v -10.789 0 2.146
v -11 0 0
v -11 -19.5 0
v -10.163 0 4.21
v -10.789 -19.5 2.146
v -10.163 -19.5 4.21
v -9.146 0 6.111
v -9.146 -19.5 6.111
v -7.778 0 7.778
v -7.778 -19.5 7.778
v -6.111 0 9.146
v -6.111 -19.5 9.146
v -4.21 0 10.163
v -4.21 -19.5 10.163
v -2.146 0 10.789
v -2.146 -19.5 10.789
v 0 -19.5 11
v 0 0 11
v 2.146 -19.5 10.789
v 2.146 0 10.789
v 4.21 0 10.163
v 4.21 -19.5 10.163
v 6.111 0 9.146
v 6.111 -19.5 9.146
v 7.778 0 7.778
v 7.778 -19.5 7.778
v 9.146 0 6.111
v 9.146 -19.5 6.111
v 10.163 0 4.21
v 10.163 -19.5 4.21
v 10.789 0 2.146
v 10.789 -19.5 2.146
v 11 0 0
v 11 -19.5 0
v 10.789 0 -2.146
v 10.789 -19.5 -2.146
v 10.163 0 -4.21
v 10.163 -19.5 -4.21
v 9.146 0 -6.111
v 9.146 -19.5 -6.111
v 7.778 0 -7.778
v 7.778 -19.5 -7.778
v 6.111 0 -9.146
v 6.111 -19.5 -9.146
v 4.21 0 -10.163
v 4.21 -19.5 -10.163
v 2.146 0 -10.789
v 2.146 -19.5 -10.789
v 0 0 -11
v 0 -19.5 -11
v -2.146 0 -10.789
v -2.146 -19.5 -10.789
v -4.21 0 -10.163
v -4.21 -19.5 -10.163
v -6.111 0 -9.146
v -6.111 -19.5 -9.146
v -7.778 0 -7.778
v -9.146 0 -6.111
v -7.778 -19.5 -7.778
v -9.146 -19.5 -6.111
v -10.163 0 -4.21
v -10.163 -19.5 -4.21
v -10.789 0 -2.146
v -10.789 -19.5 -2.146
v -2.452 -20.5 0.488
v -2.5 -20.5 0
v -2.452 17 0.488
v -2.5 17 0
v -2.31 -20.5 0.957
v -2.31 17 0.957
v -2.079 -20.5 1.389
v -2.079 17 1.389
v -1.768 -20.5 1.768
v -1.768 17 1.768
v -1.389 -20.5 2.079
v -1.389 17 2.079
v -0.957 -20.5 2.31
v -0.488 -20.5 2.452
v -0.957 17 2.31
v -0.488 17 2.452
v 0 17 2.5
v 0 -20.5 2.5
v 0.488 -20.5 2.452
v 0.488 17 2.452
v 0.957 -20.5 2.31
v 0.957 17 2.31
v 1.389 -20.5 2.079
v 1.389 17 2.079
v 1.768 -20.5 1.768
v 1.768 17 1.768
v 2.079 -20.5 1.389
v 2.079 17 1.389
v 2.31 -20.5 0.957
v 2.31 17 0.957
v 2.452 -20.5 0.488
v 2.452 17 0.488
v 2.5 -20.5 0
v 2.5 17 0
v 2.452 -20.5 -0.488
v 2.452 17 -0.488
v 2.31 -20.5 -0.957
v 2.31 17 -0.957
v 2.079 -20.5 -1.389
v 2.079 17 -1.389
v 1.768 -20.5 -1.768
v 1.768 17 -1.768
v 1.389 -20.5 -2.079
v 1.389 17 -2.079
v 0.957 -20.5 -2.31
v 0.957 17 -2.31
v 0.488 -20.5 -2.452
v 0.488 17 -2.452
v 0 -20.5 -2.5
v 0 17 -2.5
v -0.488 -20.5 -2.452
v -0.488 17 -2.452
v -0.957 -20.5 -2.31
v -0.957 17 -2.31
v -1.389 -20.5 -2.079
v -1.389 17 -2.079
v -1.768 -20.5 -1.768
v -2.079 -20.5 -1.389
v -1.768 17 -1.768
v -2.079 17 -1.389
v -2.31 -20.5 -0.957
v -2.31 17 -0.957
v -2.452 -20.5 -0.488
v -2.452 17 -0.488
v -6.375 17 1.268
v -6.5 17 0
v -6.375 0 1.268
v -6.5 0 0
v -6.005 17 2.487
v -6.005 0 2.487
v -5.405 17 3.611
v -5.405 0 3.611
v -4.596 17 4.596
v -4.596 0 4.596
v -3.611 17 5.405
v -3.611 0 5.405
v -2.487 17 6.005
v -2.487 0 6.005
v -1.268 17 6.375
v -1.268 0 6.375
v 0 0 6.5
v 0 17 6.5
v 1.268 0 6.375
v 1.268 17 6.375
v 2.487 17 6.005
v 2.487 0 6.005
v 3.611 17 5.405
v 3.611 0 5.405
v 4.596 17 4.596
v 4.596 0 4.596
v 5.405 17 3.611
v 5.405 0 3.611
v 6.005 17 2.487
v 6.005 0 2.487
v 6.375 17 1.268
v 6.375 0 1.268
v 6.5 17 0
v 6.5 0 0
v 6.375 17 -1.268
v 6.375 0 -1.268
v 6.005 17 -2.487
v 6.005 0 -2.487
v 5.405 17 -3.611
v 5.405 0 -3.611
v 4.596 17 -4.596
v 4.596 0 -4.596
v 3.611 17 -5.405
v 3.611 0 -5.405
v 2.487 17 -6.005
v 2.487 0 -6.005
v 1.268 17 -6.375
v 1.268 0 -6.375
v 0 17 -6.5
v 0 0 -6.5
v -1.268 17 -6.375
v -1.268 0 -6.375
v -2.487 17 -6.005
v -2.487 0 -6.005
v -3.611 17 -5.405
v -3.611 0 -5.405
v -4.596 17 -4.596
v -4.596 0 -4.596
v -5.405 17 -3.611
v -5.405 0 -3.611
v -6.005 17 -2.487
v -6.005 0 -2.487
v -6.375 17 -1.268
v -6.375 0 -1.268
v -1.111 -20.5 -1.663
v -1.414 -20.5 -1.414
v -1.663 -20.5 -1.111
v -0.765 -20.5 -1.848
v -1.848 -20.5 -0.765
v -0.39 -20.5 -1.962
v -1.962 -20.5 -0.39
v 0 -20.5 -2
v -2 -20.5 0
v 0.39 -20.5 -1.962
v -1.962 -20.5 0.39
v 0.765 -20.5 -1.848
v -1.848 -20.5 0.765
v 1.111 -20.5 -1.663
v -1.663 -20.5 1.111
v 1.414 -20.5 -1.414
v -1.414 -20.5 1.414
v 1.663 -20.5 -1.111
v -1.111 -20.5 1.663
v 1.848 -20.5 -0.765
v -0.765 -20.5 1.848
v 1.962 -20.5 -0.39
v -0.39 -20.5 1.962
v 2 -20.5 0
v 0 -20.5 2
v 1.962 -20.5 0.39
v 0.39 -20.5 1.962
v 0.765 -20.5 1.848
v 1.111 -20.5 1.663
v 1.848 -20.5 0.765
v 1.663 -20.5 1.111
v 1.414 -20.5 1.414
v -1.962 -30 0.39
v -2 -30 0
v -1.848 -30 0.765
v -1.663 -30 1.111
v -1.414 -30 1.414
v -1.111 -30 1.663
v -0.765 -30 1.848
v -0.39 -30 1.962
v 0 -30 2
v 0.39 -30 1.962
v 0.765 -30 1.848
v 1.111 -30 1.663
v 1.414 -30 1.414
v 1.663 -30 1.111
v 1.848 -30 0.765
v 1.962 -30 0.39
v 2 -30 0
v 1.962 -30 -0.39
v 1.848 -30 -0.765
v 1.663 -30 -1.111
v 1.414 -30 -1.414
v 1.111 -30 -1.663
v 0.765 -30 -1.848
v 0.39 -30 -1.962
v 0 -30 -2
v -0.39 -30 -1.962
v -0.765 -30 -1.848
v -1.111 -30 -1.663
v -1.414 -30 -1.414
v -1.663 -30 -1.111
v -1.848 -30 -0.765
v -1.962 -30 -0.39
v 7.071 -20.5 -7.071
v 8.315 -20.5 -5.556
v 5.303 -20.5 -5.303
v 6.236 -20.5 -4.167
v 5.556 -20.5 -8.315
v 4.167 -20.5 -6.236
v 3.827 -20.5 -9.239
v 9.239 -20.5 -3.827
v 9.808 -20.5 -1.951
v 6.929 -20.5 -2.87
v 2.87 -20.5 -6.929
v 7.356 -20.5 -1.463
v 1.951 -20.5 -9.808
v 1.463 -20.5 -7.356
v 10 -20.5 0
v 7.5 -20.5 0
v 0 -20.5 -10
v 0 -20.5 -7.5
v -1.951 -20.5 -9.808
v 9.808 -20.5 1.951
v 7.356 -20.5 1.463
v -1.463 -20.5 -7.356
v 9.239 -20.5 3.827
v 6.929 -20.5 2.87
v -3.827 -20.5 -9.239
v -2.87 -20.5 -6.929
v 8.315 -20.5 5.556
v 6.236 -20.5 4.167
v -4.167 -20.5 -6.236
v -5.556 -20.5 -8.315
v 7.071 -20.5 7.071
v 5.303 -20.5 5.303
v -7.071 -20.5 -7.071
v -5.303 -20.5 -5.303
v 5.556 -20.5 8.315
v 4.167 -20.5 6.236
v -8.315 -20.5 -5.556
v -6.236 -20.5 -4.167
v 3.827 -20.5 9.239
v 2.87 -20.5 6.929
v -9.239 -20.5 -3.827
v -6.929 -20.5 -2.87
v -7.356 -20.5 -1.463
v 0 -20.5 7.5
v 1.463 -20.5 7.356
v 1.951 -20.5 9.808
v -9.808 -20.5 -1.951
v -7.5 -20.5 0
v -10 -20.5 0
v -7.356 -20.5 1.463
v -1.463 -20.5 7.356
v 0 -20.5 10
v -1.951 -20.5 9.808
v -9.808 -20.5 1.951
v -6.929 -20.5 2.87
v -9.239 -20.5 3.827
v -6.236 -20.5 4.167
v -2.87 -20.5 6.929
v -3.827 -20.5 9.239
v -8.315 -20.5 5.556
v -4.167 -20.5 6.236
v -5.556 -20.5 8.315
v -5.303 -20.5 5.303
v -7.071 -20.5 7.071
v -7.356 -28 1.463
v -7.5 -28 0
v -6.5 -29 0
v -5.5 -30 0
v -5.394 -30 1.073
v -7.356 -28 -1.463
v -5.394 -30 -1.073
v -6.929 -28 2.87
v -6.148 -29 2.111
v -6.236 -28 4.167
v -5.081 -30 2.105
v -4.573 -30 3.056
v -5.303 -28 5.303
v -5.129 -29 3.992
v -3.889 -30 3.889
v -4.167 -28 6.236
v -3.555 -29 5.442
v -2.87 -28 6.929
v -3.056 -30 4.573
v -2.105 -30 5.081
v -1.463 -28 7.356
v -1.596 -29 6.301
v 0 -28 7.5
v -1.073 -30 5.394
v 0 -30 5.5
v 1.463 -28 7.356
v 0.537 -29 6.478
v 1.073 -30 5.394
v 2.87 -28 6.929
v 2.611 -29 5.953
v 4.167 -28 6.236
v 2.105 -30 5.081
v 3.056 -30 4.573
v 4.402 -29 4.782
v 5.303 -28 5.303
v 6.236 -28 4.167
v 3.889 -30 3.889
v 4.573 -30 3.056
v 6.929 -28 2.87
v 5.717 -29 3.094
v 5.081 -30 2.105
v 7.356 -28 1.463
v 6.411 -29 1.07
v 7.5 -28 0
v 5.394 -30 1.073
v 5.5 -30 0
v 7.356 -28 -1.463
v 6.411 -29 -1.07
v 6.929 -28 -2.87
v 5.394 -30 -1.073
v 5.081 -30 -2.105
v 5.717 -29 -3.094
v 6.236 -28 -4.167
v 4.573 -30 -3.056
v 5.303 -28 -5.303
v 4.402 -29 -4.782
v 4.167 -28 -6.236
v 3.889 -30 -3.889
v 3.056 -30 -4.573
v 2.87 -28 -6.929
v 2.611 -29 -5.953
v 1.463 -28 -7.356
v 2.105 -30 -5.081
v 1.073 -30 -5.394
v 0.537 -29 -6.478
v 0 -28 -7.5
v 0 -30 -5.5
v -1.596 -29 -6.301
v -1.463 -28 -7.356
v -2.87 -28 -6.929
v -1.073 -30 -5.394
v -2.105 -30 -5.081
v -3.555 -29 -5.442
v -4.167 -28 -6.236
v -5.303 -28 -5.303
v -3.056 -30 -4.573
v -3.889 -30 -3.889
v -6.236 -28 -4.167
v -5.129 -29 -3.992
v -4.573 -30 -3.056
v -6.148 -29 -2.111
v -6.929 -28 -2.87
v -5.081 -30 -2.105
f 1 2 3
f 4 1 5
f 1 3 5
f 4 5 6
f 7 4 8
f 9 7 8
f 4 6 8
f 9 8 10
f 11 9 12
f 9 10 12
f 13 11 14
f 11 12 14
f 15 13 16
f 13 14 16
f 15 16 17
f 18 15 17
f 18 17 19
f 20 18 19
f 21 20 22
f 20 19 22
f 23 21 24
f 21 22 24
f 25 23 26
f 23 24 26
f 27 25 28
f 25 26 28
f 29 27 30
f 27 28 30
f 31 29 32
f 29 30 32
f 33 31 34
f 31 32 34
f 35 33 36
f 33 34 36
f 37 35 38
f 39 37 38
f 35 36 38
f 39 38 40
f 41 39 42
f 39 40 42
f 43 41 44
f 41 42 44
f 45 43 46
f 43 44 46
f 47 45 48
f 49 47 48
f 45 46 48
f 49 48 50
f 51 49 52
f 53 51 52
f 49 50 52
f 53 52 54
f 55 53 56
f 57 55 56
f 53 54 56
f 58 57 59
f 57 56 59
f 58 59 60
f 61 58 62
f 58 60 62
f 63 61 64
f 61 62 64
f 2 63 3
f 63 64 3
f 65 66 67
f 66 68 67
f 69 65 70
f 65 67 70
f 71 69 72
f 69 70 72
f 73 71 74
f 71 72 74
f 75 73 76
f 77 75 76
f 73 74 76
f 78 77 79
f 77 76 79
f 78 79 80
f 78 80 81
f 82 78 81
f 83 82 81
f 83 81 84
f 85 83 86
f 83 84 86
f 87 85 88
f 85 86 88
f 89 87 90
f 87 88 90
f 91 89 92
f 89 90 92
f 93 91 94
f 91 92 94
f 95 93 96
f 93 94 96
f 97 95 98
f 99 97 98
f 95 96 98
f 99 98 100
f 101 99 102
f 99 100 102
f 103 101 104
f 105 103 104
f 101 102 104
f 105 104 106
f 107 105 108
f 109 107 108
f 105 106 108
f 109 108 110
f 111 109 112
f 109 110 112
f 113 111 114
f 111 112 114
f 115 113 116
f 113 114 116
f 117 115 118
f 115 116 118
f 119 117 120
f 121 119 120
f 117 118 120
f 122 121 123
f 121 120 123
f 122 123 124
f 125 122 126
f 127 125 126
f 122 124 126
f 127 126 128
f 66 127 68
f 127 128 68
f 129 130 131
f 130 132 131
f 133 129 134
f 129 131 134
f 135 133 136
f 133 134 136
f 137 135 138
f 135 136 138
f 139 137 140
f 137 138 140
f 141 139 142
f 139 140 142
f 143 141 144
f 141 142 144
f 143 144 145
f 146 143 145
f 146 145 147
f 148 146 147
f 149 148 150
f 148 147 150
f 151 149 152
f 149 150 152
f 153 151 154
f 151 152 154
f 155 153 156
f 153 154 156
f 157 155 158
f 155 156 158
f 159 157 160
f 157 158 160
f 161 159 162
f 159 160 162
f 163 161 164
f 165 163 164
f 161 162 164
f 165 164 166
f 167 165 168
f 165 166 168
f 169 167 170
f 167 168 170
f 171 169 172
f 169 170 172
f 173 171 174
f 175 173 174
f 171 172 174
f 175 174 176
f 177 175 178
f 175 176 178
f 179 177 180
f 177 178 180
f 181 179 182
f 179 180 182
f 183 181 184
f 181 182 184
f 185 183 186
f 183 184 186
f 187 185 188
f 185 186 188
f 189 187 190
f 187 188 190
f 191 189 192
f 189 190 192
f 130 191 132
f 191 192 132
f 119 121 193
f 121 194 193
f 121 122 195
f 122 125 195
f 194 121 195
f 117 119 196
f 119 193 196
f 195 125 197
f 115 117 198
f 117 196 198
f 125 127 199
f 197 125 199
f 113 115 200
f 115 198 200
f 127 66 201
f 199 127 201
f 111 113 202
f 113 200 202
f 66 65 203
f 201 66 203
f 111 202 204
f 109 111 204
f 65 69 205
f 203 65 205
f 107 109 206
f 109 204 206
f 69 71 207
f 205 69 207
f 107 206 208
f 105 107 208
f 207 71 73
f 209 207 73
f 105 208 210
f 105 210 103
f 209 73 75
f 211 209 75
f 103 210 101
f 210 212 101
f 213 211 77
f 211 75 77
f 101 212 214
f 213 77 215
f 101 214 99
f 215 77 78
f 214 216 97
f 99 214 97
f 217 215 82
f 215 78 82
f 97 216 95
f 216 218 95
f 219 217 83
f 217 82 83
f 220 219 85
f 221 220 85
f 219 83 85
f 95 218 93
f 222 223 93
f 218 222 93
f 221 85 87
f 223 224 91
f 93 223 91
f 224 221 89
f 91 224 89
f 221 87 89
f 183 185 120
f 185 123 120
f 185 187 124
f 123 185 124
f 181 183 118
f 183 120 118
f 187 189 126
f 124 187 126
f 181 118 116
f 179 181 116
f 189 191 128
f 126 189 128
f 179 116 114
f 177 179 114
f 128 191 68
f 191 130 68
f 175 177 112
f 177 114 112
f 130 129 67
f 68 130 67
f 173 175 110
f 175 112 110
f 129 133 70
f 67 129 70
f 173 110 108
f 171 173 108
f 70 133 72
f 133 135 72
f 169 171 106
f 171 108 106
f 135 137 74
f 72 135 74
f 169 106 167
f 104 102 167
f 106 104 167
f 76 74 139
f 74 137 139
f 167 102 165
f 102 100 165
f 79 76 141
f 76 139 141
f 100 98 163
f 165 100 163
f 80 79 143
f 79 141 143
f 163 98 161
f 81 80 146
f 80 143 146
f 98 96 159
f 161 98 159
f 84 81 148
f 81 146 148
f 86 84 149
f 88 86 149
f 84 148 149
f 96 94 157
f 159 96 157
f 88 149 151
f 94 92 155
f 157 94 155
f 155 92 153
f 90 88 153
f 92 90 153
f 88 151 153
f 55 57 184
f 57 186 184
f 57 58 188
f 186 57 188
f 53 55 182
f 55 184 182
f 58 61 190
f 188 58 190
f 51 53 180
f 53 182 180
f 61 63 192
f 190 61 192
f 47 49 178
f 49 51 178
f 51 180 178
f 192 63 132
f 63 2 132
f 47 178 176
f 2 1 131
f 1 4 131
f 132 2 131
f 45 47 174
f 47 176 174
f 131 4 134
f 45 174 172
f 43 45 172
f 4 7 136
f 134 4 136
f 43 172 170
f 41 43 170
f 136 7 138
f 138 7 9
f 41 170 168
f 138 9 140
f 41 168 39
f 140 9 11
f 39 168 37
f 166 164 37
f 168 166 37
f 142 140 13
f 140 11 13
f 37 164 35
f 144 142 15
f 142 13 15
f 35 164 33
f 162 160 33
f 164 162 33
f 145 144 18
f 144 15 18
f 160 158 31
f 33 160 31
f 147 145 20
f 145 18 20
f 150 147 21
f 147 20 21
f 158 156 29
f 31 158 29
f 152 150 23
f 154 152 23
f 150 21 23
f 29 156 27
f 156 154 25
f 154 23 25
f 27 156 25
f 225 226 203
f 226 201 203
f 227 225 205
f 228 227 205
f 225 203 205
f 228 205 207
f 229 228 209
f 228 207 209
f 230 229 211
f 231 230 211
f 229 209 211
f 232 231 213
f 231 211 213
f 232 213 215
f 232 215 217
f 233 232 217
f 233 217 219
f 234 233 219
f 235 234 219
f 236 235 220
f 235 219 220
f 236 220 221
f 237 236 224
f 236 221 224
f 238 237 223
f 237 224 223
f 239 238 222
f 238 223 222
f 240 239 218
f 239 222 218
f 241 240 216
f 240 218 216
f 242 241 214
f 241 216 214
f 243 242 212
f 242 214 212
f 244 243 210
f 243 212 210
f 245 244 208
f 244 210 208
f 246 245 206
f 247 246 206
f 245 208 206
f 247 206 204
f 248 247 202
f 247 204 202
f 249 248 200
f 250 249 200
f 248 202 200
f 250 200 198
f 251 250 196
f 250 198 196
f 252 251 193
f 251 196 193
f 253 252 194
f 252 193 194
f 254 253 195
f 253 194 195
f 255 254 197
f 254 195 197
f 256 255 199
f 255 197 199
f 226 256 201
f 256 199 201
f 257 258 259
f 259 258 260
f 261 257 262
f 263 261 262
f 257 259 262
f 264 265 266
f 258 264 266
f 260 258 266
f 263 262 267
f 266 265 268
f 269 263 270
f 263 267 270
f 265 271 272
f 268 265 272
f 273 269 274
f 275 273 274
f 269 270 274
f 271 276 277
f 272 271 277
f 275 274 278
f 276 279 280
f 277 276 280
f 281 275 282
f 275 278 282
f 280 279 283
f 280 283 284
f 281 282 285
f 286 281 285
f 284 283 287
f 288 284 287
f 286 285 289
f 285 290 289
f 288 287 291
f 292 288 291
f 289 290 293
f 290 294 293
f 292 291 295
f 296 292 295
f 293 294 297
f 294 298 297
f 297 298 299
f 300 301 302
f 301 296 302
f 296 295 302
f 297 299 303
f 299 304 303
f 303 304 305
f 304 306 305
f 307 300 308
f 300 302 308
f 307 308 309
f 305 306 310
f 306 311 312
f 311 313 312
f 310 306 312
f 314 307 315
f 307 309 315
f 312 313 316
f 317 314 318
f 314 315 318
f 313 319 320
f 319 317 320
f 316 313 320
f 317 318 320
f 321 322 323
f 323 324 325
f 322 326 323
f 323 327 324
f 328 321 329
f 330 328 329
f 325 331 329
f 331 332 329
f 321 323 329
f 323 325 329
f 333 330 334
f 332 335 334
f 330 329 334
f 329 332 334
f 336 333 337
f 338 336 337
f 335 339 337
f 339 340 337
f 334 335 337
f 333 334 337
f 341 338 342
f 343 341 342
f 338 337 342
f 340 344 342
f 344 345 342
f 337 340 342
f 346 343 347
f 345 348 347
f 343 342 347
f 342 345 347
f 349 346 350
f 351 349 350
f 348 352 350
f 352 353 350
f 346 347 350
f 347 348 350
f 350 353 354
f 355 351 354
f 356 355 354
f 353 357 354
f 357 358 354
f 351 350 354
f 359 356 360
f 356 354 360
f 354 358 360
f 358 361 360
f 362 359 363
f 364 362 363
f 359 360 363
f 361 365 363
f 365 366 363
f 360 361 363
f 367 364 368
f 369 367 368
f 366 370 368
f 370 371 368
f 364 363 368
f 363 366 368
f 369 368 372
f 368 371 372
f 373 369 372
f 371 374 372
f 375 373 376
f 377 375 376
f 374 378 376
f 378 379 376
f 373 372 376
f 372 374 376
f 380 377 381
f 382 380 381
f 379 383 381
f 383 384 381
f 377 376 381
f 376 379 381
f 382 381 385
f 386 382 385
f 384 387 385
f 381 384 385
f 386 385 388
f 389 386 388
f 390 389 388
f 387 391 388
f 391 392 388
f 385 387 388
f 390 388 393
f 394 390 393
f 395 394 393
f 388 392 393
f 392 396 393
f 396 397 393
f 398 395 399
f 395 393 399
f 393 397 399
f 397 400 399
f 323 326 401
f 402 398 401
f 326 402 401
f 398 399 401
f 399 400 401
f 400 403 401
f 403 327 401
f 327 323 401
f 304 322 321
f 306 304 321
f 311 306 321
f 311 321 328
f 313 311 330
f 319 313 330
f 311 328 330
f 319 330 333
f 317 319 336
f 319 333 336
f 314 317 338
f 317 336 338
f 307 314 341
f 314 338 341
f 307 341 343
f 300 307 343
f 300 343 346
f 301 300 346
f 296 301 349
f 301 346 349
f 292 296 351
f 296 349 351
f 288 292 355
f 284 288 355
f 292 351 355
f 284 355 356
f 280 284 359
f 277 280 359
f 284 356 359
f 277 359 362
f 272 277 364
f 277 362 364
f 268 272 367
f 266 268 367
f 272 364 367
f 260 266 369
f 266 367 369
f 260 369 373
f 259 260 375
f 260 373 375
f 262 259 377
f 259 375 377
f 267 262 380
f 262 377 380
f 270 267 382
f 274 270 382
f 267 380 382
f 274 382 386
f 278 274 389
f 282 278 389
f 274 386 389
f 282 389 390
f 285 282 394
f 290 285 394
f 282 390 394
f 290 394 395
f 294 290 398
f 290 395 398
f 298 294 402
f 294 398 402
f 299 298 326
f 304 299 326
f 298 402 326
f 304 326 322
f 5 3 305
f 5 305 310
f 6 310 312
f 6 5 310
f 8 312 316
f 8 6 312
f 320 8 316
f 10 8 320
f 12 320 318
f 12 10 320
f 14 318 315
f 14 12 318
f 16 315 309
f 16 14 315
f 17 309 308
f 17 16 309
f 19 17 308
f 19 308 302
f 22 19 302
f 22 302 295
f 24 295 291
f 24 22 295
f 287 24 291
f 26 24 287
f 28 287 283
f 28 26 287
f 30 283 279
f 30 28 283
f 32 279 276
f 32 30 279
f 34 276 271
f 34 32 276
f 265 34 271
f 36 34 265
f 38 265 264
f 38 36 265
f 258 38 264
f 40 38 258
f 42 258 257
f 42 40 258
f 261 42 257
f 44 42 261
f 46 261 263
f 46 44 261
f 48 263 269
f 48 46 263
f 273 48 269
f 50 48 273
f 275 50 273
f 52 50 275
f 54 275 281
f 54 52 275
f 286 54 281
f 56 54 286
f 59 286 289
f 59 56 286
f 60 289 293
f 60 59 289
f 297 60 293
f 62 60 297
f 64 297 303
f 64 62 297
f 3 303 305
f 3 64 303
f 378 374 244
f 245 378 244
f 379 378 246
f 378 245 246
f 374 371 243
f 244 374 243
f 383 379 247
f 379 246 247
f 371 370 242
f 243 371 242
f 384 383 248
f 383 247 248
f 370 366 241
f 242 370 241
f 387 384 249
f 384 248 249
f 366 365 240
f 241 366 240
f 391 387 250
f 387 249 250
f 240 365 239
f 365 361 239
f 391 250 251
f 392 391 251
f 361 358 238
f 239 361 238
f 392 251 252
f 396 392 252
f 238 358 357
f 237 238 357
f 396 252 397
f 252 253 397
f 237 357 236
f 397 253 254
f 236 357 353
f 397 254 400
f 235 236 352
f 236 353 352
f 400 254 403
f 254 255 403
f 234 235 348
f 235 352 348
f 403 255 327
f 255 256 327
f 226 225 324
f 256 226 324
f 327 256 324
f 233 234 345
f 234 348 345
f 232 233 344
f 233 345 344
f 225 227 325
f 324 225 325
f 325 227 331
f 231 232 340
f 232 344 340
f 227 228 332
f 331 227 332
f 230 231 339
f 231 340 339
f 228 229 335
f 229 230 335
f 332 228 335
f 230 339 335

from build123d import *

# Parameters (mm, degrees)
CHAMFER1_SIZE = 2
CHAMFER2_SIZE = 1


with BuildPart() as part:
    # Sketch1 → Revolve1 (revolve)
    with BuildSketch(Plane.XY):
        Polygon((-7.5, -20.5), (-7.5, -30), (-2, -30), (-2, -20.5), (-2.5, -20.5), (-2.5, 17), (-6.5, 17), (-6.5, 0), (-11, 0), (-11, -20.5), align=None)
    revolve(axis=Axis((0, -30, 0), (0, 1, 0)))

    # Chamfer1
    chamfer1_edges = [part.edges().sort_by_distance(p)[0] for p in [
        (7.5, -30, 0),
    ]]
    chamfer(chamfer1_edges, length=CHAMFER1_SIZE)

    # Chamfer2
    chamfer2_edges = [part.edges().sort_by_distance(p)[0] for p in [
        (11, -20.5, 0),
    ]]
    chamfer(chamfer2_edges, length=CHAMFER2_SIZE)


solid = part.part
